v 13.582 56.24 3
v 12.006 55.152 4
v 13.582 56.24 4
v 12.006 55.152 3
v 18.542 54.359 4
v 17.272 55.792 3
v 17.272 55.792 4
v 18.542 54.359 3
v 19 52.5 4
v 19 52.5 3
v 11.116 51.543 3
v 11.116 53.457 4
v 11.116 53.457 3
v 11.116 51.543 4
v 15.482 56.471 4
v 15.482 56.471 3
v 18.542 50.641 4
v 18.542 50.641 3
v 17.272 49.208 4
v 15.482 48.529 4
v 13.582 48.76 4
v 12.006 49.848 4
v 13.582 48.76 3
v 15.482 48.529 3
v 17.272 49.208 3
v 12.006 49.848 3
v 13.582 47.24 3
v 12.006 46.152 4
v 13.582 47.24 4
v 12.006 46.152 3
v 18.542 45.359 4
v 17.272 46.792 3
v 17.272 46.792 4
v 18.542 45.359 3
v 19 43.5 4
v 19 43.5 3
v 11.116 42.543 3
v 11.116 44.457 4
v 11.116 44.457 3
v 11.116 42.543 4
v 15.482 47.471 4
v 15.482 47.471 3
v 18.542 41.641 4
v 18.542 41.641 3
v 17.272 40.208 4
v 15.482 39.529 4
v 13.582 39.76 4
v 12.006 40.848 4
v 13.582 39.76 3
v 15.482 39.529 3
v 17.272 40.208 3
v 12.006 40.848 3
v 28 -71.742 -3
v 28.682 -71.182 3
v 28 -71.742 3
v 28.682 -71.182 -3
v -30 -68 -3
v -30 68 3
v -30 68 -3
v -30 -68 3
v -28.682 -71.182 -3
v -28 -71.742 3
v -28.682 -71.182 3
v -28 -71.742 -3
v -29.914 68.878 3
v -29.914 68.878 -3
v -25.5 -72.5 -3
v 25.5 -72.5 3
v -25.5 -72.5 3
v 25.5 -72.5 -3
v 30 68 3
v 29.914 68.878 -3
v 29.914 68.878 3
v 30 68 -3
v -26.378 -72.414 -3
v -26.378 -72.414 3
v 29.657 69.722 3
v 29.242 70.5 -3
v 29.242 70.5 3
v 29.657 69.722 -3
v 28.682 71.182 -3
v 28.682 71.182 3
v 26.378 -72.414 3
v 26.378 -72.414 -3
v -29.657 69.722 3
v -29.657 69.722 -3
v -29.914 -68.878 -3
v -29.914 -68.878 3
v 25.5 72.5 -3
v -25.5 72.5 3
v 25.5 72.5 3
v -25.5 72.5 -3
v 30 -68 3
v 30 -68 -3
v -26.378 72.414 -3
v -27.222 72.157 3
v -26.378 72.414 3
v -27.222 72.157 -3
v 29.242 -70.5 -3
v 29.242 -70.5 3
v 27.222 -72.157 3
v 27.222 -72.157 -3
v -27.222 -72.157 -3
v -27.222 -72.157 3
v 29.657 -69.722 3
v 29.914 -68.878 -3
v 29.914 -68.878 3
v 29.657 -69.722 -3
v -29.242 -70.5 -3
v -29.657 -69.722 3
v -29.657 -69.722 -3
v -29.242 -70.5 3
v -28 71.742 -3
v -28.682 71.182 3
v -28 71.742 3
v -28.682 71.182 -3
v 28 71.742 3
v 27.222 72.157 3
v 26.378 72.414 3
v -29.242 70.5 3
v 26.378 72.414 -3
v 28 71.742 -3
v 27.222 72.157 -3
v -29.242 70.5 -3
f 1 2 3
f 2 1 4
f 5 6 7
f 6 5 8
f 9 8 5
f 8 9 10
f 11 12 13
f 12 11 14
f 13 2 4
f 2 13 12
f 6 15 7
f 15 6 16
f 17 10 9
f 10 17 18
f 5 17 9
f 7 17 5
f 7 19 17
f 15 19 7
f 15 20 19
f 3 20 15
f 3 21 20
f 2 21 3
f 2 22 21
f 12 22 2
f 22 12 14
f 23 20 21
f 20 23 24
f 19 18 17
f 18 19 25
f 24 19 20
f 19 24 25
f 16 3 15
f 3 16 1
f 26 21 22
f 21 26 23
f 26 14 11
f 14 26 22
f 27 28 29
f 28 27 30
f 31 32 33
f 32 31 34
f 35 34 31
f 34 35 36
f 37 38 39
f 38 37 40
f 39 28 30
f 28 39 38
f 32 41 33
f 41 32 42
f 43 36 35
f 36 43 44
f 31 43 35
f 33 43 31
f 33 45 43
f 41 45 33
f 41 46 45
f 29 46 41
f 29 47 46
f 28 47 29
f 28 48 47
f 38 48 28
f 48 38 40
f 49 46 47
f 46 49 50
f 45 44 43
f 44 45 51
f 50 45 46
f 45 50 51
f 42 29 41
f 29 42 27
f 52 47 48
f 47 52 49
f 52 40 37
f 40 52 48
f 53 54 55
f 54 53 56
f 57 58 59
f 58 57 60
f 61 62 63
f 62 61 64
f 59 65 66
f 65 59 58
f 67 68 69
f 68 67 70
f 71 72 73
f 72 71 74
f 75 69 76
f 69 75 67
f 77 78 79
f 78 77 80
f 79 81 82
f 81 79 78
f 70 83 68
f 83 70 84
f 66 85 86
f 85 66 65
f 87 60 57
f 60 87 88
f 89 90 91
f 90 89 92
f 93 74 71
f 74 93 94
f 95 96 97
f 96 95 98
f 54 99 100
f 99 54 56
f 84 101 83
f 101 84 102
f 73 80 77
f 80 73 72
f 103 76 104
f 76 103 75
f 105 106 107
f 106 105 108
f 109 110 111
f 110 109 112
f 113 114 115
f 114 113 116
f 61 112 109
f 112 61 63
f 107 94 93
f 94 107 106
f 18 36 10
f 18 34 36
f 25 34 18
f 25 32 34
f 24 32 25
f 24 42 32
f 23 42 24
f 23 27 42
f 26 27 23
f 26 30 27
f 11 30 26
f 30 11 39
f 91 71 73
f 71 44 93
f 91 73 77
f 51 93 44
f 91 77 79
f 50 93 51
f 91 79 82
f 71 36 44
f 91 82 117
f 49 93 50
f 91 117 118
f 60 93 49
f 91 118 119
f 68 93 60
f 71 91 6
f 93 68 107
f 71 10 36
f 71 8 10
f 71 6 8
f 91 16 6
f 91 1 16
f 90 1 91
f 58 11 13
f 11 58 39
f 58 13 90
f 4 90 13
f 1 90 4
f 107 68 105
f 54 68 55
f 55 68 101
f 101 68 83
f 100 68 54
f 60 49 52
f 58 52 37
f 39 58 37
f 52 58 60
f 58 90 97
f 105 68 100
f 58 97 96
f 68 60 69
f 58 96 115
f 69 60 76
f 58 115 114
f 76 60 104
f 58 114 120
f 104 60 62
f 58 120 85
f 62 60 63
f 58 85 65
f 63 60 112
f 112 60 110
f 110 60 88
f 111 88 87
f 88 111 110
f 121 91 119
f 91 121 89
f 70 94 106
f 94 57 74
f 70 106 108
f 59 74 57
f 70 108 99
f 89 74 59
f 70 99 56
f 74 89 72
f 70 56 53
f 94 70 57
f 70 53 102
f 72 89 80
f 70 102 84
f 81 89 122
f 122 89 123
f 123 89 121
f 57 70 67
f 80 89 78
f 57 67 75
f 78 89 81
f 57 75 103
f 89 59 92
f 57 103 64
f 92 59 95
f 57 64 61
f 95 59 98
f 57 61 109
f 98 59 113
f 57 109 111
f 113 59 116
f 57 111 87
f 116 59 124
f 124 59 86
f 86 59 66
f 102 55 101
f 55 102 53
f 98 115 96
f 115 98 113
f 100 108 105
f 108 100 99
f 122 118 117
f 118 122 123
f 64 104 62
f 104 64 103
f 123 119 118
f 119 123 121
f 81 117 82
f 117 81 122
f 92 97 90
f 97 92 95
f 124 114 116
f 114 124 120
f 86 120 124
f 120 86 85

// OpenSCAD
echo("Работа Лукьянова Данила!");
len_phone = 145;
width_phone = 60;
thickness_phone = 6;
corner_round = 9;

smartphone();



module smartphone() {
    smartphone_block();
    cameras_block();
}

module cameras_block() {
    color("blue")
    translate([width_phone/2-15, len_phone/2-20, 0])
    cylinder(d=8, h = thickness_phone/2+1);

    color("blue")
    translate([width_phone/2-15, len_phone/2-29, 0])
    cylinder(d=8, h = thickness_phone/2+1);
}

module smartphone_block() {
    hull() {
        translate([width_phone/2-corner_round/2, len_phone/2-corner_round/2, 0])
        cylinder(h=thickness_phone, d=corner_round, $fn=32, center=true);
        
        mirror([1, 0, 0])
        translate([width_phone/2-corner_round/2, len_phone/2-corner_round/2, 0])
        cylinder(h=thickness_phone, d=corner_round, $fn=32, center=true);
        
        mirror([0, 1, 0])
        translate([width_phone/2-corner_round/2, len_phone/2-corner_round/2, 0])
        cylinder(h=thickness_phone, d=corner_round, $fn=32, center=true);
        
        mirror([1, 0, 0])
        mirror([0, 1, 0])
        translate([width_phone/2-corner_round/2, len_phone/2-corner_round/2, 0])
        cylinder(h=thickness_phone, d=corner_round, $fn=32, center=true);
    }
}
